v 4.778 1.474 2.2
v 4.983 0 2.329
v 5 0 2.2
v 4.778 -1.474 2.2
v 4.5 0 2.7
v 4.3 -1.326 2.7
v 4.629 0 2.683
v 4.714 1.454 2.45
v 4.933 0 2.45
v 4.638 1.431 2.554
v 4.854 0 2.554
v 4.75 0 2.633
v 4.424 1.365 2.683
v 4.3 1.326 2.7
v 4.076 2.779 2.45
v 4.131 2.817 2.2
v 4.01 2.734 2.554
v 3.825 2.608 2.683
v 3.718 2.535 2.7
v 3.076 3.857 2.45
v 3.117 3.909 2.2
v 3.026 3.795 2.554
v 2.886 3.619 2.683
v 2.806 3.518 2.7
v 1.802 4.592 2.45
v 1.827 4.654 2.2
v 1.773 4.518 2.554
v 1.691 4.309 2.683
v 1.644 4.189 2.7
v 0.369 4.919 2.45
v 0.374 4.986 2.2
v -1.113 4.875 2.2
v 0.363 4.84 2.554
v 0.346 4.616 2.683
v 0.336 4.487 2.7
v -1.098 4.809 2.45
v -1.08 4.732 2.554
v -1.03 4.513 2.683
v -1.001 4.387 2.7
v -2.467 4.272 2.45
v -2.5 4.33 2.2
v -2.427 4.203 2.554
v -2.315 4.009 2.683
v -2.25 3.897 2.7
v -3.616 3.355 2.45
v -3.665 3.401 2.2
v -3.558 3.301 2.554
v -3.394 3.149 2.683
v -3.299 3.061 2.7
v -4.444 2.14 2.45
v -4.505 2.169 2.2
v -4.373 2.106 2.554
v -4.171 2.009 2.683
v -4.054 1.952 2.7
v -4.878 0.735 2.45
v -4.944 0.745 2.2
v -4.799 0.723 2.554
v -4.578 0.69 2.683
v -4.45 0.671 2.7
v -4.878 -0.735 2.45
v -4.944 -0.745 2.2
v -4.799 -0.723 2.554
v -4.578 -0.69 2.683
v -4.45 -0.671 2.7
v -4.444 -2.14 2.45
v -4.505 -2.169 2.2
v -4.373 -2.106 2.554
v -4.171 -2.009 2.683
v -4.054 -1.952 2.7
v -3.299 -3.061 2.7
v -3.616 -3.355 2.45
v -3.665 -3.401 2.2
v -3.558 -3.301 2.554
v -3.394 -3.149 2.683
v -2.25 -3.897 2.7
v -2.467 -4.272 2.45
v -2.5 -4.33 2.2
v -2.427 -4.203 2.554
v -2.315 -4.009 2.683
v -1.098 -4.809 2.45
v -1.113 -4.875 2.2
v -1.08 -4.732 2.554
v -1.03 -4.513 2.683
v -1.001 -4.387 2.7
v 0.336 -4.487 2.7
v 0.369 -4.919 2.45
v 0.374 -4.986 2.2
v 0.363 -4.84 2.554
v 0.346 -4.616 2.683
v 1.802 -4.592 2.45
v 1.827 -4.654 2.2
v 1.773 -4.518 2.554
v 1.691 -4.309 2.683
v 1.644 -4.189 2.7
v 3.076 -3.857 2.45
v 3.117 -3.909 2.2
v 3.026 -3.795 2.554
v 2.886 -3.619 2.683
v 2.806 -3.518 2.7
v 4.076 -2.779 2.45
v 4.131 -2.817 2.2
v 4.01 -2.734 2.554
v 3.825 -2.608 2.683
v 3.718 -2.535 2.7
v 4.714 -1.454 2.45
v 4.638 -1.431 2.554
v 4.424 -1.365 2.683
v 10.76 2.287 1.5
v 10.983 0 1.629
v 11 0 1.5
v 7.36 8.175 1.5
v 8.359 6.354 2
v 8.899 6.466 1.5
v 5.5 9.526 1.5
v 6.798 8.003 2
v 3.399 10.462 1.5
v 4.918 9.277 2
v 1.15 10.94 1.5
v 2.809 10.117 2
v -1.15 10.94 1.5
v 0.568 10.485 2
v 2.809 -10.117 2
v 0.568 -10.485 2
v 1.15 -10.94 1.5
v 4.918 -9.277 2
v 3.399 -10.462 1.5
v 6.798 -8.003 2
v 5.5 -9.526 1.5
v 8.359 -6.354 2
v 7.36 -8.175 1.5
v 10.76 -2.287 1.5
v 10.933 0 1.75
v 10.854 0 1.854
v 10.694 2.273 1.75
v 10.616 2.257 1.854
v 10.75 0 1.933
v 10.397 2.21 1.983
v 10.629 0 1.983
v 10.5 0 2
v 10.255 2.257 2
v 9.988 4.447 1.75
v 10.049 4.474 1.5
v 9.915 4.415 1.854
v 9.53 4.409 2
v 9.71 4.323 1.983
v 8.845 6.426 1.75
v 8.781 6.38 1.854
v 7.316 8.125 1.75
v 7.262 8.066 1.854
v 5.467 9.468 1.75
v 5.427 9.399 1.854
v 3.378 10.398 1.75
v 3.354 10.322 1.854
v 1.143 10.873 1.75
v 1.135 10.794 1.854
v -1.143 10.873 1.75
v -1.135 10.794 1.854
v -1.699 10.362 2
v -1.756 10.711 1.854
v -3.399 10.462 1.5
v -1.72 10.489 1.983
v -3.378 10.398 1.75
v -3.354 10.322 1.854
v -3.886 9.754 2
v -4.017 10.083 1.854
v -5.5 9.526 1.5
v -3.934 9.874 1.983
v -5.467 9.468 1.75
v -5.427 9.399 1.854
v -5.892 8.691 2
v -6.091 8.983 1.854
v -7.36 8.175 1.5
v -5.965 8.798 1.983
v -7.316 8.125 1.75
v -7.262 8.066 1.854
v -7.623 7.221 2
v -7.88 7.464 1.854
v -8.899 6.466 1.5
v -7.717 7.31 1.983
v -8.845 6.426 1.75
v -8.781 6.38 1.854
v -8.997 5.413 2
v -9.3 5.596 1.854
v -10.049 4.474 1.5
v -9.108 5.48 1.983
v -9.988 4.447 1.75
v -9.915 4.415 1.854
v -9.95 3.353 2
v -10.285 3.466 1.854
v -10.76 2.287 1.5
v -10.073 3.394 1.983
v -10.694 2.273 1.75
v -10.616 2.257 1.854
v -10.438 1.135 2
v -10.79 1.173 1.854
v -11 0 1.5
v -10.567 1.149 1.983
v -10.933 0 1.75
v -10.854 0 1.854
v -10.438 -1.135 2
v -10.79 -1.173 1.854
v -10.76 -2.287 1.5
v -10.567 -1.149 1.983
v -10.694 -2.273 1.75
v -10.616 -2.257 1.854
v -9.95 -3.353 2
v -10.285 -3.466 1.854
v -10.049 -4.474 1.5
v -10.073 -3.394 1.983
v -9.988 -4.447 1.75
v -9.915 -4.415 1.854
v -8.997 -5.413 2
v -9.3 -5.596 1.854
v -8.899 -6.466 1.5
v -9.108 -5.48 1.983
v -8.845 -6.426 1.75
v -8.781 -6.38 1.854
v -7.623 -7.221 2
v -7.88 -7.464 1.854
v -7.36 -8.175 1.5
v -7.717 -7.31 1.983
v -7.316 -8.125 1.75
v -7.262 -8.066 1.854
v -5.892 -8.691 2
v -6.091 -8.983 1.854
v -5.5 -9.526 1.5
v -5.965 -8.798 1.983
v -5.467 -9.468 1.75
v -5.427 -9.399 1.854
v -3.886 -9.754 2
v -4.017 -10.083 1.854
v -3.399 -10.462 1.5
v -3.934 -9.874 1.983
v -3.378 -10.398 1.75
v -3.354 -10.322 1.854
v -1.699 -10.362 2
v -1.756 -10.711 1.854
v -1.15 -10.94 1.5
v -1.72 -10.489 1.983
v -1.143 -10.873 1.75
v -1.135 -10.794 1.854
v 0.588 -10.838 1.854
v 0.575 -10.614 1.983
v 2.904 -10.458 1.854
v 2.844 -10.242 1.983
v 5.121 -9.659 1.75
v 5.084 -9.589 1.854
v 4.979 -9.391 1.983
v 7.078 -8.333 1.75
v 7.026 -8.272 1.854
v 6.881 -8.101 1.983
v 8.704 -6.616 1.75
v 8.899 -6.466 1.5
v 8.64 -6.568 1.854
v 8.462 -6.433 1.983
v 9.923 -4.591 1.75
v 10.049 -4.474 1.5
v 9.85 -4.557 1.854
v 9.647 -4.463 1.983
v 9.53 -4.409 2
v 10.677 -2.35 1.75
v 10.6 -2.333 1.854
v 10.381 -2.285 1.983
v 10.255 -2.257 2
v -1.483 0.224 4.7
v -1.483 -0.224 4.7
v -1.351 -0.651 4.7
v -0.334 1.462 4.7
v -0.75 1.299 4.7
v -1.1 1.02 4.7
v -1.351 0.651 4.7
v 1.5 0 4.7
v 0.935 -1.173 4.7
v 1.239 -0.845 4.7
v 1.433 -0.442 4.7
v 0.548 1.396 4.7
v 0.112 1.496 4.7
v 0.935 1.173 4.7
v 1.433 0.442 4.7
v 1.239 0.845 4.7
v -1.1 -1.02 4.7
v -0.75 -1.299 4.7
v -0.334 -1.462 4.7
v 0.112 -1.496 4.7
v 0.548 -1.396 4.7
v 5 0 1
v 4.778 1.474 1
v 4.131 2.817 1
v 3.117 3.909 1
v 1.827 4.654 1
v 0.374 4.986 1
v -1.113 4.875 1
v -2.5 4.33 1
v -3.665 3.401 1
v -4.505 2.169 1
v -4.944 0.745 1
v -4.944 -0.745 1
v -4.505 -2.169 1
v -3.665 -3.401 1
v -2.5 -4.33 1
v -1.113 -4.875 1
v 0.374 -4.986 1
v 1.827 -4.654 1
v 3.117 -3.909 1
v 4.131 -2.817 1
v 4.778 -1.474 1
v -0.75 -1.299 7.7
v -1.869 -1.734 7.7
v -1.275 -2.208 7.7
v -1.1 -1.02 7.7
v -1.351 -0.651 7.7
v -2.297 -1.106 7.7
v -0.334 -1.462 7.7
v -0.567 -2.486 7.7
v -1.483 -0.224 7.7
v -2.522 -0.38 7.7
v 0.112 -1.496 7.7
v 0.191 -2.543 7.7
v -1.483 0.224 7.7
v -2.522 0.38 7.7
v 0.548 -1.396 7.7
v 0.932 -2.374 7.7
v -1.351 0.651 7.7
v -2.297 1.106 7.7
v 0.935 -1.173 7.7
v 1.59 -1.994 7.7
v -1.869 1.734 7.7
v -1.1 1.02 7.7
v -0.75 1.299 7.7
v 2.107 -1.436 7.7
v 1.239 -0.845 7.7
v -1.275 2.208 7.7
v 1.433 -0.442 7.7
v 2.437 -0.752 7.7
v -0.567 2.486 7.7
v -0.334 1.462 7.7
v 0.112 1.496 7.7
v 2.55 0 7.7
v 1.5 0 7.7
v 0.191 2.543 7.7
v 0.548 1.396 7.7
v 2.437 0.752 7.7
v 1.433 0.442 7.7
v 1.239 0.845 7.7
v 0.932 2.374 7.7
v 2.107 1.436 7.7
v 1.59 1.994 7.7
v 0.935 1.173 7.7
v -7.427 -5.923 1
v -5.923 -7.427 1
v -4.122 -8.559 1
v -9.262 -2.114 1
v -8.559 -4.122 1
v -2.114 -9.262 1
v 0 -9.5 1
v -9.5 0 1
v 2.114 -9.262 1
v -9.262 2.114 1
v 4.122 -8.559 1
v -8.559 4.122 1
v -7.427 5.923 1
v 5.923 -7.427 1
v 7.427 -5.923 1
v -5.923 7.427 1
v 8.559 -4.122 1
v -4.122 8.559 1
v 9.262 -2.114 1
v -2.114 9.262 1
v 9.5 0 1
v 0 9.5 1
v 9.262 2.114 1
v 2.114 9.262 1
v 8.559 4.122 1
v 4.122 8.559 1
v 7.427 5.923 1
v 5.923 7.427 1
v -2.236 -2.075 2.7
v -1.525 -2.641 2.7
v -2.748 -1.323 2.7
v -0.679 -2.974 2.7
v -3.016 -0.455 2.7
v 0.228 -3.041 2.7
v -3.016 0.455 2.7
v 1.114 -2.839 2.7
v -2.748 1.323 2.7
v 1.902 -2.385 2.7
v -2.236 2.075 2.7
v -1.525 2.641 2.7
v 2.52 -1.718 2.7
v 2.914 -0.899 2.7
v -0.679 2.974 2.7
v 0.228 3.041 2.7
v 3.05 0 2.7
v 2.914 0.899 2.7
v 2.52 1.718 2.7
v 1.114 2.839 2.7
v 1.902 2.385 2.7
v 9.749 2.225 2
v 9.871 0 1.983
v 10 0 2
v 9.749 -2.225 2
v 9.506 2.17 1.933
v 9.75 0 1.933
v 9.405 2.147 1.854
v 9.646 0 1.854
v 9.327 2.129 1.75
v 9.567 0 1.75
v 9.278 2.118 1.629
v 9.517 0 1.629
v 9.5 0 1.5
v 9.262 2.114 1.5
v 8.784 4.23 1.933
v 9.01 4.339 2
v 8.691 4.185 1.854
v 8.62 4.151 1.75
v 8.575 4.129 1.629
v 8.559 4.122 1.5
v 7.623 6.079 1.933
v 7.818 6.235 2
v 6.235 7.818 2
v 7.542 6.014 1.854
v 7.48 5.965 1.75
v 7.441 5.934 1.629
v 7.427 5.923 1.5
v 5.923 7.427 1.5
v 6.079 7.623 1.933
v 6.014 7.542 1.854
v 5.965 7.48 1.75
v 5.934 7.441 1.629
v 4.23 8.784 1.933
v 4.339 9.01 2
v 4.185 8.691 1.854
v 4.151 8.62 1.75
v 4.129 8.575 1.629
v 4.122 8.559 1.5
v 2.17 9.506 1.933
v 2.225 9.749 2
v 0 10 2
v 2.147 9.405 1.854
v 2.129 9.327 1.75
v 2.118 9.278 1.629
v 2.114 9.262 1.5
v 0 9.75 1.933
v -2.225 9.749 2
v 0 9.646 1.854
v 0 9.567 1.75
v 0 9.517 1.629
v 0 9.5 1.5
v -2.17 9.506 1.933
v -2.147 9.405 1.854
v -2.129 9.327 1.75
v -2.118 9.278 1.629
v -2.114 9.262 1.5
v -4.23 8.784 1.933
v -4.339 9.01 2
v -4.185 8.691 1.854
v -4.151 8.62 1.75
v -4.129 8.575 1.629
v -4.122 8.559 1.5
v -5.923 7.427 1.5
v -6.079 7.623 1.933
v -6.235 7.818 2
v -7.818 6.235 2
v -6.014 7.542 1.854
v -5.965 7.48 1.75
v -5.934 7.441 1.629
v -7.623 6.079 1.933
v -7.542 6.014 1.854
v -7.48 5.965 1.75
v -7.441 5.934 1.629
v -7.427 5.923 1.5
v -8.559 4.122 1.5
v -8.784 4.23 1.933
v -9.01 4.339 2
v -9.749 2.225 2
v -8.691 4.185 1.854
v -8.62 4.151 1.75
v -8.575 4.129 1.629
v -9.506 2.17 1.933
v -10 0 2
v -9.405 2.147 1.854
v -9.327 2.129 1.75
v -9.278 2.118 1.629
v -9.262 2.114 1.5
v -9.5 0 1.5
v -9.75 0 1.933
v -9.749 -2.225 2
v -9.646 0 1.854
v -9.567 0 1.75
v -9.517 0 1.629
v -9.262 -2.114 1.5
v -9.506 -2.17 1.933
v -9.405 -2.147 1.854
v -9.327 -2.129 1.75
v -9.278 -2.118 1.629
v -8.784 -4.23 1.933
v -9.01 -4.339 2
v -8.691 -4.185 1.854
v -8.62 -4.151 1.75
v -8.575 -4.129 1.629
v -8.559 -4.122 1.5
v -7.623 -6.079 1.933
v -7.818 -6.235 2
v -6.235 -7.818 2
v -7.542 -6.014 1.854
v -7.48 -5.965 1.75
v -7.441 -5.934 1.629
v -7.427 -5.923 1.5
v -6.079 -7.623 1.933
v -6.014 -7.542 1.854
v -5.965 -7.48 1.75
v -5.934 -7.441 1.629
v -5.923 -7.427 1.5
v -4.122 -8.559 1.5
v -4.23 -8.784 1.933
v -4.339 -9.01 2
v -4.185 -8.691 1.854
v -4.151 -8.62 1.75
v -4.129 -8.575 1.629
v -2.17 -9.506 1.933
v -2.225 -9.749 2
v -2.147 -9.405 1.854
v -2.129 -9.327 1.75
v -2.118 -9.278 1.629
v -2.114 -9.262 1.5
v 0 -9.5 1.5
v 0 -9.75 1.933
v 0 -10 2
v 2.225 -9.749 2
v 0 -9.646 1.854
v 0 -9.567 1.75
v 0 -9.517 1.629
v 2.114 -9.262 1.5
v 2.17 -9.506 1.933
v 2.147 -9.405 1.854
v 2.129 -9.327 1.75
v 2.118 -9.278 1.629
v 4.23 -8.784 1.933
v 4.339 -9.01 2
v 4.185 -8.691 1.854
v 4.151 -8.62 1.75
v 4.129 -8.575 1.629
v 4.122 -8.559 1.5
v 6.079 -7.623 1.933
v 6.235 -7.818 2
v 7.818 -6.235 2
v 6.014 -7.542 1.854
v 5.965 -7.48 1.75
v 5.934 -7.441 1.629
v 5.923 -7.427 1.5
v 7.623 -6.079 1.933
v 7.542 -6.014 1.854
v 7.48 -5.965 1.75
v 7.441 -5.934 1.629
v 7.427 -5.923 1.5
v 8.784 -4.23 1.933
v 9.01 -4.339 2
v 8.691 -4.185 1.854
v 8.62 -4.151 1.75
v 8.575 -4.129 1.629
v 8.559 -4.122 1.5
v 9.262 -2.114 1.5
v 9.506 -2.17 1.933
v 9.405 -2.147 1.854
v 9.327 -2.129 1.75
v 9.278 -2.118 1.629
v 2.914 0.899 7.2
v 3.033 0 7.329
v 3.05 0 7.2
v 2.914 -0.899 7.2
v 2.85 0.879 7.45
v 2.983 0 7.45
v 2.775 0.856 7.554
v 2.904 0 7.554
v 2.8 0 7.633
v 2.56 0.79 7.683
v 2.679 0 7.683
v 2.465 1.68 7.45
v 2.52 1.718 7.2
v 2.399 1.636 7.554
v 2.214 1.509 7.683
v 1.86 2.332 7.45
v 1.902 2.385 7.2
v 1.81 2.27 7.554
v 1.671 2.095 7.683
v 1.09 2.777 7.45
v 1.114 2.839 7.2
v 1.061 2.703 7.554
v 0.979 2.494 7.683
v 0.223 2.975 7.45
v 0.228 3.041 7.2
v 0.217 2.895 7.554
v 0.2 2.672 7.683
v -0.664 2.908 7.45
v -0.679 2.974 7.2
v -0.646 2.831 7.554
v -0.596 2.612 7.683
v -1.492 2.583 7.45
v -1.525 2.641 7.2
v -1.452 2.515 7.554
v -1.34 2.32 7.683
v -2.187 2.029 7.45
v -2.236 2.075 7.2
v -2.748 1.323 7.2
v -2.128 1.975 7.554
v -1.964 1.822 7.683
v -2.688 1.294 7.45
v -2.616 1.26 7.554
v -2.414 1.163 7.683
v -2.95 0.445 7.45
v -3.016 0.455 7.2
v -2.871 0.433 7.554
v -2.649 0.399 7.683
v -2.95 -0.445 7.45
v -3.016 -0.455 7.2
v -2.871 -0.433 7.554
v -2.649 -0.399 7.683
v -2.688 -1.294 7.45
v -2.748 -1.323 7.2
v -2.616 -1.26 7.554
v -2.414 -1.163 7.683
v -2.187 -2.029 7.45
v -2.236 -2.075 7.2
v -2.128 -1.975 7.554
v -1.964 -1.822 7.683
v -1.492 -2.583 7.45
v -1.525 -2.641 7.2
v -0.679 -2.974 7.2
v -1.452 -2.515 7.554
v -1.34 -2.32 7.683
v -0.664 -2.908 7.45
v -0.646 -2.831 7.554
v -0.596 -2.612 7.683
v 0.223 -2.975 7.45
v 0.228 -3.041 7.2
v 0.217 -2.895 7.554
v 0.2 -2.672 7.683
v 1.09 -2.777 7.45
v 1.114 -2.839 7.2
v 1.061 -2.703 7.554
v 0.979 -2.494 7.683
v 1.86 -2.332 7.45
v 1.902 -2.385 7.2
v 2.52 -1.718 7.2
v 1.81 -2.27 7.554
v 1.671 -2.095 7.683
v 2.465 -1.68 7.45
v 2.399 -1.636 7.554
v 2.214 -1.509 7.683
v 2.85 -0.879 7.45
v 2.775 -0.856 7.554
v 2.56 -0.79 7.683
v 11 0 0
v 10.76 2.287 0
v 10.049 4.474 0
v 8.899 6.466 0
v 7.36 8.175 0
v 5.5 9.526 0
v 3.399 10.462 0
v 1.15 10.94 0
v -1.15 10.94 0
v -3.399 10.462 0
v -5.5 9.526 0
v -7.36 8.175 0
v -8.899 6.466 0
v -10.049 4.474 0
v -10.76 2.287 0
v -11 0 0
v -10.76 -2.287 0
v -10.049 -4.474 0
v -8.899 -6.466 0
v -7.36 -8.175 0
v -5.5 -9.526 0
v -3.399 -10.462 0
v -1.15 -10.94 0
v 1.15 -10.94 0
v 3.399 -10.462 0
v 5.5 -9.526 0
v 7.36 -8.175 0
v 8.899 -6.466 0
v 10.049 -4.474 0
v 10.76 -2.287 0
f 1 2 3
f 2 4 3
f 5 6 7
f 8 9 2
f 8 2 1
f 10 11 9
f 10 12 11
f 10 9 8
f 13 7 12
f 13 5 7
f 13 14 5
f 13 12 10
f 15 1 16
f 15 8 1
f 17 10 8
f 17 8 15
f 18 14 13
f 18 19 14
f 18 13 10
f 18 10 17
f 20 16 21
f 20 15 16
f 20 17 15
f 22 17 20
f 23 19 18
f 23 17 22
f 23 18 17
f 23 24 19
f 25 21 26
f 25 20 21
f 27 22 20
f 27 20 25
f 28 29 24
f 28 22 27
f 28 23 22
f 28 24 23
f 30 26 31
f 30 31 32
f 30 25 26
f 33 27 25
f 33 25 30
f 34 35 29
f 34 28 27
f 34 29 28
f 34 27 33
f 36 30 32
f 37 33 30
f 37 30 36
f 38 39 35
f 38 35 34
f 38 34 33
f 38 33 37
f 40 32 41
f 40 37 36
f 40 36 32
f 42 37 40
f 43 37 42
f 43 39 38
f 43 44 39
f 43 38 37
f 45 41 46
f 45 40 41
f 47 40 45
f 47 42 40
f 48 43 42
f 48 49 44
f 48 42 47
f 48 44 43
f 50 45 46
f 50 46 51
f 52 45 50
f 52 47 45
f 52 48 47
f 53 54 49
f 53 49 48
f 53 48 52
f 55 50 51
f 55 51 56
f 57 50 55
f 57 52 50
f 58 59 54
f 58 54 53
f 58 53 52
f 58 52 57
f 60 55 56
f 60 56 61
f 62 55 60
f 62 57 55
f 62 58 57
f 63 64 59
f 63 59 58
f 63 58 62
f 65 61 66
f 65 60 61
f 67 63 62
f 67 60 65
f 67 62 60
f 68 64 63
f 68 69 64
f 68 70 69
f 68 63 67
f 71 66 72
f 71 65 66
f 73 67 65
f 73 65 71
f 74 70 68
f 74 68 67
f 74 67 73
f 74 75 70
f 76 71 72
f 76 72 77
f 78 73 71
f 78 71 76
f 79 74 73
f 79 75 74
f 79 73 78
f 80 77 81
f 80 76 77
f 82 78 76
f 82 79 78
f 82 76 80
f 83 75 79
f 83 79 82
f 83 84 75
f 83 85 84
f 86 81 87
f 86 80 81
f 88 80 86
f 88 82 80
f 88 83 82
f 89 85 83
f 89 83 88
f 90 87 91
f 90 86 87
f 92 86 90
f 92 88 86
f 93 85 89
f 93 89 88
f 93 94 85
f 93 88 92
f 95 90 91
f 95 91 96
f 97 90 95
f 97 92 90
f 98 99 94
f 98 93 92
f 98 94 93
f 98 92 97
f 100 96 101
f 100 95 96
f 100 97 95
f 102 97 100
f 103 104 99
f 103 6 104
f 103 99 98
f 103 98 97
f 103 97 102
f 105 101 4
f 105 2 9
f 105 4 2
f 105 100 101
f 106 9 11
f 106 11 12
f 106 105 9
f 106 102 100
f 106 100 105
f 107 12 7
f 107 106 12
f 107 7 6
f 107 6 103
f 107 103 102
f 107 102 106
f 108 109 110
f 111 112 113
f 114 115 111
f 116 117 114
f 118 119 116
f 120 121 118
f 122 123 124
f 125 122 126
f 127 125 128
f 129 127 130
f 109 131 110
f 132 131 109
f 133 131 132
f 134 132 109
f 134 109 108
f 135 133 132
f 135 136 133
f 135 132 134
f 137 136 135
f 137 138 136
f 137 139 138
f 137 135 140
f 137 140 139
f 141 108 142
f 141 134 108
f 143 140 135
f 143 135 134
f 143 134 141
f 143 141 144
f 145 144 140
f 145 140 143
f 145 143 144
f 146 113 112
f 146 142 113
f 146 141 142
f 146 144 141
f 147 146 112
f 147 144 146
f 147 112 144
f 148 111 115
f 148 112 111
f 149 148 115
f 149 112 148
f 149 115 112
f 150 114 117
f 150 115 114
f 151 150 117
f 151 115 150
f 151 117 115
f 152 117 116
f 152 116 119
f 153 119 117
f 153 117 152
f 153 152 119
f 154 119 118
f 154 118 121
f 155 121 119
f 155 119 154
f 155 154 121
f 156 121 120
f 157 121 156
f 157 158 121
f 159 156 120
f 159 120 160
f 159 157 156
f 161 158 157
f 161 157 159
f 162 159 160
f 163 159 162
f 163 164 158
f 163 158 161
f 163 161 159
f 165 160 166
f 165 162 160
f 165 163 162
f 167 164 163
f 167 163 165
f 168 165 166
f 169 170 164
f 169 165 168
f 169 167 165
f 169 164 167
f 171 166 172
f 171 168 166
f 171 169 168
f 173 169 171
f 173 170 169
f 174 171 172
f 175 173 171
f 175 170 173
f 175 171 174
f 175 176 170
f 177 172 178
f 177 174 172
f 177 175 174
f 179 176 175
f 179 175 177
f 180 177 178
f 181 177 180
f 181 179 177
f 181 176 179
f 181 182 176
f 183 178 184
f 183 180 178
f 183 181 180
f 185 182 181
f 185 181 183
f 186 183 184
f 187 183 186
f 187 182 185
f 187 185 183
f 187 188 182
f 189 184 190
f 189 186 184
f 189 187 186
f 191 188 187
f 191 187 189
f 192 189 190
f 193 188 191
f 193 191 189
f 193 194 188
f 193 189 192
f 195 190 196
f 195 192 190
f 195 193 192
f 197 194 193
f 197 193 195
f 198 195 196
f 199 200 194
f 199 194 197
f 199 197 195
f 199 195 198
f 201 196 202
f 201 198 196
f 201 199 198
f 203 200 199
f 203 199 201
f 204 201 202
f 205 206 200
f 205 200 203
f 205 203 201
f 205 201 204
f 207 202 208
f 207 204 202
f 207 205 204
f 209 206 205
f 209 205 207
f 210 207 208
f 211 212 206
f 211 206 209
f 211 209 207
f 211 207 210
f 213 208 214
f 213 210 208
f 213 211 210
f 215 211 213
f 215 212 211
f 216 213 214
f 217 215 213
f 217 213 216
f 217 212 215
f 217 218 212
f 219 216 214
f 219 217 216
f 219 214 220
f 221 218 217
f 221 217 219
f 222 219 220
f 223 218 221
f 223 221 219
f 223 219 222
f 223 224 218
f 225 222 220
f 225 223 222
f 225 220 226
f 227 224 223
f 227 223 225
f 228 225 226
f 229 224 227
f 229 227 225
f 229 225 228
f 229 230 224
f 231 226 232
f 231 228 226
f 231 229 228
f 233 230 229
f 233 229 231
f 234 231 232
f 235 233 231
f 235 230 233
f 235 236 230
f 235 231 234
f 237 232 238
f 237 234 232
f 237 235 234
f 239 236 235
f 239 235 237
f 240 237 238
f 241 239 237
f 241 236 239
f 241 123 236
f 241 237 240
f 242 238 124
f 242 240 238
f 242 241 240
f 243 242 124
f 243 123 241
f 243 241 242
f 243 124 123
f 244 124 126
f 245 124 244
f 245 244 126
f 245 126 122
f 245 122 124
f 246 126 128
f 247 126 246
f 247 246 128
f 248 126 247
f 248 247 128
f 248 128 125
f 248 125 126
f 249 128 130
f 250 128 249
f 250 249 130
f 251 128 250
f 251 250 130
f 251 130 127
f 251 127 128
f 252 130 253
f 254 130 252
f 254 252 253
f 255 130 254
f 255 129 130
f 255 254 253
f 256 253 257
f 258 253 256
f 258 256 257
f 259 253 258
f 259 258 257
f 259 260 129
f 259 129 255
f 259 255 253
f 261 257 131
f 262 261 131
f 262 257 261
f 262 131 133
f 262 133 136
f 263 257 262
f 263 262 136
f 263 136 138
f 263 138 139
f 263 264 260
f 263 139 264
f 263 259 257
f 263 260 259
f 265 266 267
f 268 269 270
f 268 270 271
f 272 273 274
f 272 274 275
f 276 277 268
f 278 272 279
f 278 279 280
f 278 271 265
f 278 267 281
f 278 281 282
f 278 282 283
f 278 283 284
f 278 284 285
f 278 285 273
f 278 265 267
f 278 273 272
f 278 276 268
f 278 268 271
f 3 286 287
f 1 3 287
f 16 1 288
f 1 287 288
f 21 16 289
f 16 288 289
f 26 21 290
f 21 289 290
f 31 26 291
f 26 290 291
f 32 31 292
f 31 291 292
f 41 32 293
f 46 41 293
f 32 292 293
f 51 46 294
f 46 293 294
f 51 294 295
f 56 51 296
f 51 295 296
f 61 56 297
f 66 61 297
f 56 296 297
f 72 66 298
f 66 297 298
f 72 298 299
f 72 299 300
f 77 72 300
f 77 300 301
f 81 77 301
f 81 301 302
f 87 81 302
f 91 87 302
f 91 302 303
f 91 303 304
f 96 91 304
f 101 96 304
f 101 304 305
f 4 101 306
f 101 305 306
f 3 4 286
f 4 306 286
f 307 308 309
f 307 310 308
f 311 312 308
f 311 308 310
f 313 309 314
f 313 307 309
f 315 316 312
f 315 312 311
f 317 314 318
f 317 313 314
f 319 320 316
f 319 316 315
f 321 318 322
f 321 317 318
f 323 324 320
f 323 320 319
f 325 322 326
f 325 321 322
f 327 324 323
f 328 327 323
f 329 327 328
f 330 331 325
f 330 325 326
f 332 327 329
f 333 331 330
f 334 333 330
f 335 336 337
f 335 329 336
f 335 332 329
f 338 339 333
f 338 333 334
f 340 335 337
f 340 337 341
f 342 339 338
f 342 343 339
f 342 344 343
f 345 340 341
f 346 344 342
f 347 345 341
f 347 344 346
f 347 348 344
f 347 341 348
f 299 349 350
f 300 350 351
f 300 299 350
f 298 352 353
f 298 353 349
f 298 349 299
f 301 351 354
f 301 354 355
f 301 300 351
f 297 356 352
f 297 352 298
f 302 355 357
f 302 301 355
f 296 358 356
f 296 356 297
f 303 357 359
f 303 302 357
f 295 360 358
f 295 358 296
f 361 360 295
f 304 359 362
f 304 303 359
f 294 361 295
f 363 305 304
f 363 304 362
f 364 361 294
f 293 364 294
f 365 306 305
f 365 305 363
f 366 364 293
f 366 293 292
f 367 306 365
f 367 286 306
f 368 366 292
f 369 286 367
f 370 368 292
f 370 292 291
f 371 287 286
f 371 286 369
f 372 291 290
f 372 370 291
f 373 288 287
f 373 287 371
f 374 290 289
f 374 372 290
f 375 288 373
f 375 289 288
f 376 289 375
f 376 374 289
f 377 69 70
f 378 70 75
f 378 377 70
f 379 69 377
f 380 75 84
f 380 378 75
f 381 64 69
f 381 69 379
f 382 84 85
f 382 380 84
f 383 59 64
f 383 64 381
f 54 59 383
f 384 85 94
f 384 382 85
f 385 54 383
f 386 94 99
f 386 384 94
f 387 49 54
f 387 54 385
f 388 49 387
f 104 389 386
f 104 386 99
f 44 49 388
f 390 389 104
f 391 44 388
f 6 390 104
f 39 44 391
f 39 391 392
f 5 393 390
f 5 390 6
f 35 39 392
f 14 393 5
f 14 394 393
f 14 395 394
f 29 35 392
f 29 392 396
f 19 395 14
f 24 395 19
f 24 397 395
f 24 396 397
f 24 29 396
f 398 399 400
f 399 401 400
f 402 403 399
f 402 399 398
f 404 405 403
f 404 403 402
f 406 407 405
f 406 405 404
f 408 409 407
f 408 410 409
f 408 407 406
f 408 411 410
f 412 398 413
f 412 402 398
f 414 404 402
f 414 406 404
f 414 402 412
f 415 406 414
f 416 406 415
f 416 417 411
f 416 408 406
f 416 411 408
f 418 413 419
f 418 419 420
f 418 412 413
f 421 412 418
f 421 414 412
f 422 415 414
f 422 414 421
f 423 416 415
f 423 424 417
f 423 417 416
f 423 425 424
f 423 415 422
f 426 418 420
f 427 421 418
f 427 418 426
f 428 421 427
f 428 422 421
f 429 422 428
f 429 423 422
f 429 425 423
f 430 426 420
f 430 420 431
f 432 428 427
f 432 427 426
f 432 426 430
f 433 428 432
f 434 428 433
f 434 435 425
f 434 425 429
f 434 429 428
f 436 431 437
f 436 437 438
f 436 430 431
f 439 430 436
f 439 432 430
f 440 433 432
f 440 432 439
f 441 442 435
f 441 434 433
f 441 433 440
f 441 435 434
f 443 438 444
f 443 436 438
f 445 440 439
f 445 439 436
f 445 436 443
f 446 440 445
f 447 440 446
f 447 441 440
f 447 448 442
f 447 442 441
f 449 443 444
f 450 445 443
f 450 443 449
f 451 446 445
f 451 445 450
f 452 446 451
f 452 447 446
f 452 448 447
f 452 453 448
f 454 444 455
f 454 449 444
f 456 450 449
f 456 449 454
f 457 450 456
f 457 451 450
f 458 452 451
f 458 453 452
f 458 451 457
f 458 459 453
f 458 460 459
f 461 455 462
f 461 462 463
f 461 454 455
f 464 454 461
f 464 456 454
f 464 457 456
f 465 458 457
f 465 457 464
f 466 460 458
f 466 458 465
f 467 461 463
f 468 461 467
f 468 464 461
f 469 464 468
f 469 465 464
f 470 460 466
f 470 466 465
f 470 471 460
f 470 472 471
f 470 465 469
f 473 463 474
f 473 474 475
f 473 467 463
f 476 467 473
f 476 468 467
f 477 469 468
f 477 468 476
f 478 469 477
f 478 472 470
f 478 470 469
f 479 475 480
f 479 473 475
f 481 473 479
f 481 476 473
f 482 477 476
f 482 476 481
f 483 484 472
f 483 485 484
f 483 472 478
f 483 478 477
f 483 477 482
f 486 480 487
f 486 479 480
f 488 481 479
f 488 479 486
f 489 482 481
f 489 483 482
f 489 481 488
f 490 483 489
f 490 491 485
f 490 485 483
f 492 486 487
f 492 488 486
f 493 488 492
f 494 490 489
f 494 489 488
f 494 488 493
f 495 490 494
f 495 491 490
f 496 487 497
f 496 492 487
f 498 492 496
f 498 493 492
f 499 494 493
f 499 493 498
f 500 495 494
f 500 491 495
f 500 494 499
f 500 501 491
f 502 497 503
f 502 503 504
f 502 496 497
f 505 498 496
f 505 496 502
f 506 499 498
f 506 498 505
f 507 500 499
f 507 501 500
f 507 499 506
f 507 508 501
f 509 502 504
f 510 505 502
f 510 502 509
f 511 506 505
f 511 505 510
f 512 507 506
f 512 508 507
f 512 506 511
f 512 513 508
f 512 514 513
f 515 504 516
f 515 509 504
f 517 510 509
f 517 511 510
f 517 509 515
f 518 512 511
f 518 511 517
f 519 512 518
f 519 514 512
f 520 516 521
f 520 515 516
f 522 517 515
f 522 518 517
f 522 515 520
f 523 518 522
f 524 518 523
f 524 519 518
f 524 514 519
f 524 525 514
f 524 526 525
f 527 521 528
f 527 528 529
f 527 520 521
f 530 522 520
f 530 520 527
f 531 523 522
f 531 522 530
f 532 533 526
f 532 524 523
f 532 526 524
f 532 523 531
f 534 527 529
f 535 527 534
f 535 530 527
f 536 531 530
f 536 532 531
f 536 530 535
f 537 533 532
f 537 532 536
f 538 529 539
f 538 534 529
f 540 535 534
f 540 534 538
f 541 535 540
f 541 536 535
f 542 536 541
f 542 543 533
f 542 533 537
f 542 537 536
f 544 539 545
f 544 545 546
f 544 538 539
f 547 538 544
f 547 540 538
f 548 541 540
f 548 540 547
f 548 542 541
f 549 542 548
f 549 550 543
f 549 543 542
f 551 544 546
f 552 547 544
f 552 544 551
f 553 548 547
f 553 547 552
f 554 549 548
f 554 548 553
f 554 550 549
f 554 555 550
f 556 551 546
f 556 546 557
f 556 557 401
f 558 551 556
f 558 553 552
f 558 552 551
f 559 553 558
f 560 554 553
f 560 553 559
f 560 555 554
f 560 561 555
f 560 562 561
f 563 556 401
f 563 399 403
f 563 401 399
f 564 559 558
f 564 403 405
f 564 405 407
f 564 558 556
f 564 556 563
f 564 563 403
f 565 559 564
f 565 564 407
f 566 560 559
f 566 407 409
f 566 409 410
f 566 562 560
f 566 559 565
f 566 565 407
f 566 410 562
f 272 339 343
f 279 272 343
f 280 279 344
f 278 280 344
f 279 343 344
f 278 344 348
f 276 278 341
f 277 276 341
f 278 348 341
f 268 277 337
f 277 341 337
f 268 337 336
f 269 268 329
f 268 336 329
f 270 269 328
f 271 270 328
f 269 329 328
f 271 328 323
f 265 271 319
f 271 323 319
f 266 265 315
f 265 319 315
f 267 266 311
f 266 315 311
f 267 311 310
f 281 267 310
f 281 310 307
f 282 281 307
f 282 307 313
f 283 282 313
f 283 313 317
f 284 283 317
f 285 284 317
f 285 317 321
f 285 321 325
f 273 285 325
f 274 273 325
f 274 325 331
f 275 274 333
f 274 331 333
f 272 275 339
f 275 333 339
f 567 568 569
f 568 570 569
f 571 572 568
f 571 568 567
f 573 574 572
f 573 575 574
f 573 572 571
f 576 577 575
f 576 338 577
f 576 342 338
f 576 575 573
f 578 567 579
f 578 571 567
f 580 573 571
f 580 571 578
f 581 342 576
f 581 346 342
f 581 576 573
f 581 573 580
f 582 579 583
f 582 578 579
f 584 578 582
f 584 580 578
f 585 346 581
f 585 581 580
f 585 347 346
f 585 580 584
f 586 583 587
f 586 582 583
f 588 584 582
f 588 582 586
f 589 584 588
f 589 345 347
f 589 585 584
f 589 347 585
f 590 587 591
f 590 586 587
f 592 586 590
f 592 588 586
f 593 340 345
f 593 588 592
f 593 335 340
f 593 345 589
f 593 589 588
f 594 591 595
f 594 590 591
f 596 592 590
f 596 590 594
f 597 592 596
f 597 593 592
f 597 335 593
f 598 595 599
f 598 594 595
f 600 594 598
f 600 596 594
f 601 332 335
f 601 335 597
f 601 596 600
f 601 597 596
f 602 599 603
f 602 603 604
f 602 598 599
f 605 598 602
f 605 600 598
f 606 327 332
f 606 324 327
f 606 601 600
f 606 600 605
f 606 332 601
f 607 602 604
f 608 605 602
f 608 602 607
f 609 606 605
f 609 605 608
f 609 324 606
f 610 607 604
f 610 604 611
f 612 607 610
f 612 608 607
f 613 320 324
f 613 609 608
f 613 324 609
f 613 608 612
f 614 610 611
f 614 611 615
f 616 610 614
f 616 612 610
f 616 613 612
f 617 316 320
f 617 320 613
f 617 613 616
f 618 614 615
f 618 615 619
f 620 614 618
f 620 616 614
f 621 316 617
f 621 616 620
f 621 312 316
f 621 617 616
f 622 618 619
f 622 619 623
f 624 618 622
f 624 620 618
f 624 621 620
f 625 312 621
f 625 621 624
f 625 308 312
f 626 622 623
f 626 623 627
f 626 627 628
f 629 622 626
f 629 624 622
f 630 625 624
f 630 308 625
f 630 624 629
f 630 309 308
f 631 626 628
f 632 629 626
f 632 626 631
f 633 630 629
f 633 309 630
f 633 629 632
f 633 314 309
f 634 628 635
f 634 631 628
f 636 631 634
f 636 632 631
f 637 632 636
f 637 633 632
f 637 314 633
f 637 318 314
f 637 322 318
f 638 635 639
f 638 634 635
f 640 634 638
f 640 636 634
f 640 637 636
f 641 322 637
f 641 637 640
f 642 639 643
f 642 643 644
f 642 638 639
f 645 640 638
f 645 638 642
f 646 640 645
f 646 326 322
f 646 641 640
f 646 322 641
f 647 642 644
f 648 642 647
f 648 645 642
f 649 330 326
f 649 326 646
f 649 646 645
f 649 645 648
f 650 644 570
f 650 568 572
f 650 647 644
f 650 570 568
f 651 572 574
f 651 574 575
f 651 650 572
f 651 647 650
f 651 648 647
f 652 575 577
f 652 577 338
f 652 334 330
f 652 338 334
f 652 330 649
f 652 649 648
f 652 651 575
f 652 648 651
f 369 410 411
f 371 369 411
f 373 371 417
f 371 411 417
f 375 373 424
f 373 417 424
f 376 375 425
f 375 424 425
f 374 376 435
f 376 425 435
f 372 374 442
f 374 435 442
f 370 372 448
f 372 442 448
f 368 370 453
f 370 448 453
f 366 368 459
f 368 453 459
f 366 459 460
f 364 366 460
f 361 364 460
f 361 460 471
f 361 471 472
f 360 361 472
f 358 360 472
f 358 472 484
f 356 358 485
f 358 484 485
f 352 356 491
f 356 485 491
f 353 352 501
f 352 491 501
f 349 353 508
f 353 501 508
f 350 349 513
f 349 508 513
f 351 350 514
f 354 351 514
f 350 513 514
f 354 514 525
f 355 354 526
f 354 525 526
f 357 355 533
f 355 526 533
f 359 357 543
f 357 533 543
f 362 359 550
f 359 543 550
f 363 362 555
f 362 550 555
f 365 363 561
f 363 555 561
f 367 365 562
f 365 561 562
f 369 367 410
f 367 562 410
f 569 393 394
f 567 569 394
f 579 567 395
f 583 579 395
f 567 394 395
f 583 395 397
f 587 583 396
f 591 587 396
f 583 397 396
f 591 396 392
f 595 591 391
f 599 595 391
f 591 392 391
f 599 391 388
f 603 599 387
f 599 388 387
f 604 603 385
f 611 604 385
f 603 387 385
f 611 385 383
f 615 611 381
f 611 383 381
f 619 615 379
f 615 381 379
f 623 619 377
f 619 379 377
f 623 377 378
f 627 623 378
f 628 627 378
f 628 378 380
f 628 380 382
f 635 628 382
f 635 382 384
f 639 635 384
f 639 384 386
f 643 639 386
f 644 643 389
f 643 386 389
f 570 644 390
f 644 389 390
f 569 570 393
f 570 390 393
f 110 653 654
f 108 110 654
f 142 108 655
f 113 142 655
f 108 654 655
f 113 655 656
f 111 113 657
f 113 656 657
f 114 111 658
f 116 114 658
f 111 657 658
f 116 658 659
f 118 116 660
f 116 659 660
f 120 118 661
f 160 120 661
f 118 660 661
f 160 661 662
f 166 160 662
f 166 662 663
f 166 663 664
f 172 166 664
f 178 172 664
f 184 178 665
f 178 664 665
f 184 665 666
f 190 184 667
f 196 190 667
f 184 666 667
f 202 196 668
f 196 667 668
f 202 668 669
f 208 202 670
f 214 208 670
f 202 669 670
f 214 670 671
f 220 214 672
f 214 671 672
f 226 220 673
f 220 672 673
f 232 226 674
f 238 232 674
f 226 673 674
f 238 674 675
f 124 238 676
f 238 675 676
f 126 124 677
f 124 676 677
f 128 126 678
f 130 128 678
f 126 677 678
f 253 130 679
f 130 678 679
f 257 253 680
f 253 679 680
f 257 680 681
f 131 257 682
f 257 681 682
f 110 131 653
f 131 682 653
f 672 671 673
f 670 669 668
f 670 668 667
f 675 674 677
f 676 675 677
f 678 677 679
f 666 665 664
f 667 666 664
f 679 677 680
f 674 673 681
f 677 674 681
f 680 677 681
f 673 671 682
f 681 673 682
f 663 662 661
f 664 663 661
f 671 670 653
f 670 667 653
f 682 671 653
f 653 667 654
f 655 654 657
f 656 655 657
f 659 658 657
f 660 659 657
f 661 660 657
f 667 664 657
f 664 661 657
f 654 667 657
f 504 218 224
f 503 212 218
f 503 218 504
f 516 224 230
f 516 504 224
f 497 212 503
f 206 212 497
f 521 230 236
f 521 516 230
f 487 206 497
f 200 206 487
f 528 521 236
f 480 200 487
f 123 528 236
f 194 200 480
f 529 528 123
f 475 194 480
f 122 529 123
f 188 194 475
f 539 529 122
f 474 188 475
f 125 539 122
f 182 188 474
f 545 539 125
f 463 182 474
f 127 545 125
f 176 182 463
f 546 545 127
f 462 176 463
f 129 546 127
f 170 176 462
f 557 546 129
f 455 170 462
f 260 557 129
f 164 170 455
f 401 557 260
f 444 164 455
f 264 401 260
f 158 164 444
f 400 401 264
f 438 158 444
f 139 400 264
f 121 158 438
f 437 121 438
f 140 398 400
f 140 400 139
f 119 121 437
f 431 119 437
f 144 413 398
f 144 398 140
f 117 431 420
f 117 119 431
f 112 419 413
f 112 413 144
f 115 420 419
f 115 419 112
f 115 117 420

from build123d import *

# Parameters (mm, degrees)
F0_R     = 11
F1_DEPTH = 2
F2_R     = 9.5
F3_DEPTH = 1
F4_R     = 5
F5_DEPTH = 1.7
F6_R     = 3.05
F7_DEPTH = 5
F8_R     = 1.5
F9_DEPTH = 3
F10_R    = 0.5


with BuildPart() as f1:
    # F0 (on Top) → F1 (new body)
    with BuildSketch(Plane.XY):
        Circle(F0_R)
    extrude(amount=F1_DEPTH)

    # F2 (on face) → F3 (cut)
    with BuildSketch(Plane.XY.offset(2)):
        Circle(F2_R)
    extrude(amount=-F3_DEPTH, mode=Mode.SUBTRACT)

    # F4 (on face) → F5 (join)
    with BuildSketch(Plane.XY.offset(1)):
        Circle(F4_R)
    extrude(amount=F5_DEPTH)

    # F6 (on face) → F7 (join)
    with BuildSketch(Plane.XY.offset(2.7)):
        Circle(F6_R)
    extrude(amount=F7_DEPTH)

    # F8 (on face) → F9 (cut)
    with BuildSketch(Plane.XY.offset(7.7)):
        Circle(F8_R)
    extrude(amount=-F9_DEPTH, mode=Mode.SUBTRACT)

    # F10
    f10_edges = [f1.edges().sort_by_distance(p)[0] for p in [
        (-9.5, 0, 2),
        (-11, 0, 2),
        (-3.05, 0, 7.7),
        (-5, 0, 2.7),
    ]]
    fillet(f10_edges, radius=F10_R)


solid = f1.part
